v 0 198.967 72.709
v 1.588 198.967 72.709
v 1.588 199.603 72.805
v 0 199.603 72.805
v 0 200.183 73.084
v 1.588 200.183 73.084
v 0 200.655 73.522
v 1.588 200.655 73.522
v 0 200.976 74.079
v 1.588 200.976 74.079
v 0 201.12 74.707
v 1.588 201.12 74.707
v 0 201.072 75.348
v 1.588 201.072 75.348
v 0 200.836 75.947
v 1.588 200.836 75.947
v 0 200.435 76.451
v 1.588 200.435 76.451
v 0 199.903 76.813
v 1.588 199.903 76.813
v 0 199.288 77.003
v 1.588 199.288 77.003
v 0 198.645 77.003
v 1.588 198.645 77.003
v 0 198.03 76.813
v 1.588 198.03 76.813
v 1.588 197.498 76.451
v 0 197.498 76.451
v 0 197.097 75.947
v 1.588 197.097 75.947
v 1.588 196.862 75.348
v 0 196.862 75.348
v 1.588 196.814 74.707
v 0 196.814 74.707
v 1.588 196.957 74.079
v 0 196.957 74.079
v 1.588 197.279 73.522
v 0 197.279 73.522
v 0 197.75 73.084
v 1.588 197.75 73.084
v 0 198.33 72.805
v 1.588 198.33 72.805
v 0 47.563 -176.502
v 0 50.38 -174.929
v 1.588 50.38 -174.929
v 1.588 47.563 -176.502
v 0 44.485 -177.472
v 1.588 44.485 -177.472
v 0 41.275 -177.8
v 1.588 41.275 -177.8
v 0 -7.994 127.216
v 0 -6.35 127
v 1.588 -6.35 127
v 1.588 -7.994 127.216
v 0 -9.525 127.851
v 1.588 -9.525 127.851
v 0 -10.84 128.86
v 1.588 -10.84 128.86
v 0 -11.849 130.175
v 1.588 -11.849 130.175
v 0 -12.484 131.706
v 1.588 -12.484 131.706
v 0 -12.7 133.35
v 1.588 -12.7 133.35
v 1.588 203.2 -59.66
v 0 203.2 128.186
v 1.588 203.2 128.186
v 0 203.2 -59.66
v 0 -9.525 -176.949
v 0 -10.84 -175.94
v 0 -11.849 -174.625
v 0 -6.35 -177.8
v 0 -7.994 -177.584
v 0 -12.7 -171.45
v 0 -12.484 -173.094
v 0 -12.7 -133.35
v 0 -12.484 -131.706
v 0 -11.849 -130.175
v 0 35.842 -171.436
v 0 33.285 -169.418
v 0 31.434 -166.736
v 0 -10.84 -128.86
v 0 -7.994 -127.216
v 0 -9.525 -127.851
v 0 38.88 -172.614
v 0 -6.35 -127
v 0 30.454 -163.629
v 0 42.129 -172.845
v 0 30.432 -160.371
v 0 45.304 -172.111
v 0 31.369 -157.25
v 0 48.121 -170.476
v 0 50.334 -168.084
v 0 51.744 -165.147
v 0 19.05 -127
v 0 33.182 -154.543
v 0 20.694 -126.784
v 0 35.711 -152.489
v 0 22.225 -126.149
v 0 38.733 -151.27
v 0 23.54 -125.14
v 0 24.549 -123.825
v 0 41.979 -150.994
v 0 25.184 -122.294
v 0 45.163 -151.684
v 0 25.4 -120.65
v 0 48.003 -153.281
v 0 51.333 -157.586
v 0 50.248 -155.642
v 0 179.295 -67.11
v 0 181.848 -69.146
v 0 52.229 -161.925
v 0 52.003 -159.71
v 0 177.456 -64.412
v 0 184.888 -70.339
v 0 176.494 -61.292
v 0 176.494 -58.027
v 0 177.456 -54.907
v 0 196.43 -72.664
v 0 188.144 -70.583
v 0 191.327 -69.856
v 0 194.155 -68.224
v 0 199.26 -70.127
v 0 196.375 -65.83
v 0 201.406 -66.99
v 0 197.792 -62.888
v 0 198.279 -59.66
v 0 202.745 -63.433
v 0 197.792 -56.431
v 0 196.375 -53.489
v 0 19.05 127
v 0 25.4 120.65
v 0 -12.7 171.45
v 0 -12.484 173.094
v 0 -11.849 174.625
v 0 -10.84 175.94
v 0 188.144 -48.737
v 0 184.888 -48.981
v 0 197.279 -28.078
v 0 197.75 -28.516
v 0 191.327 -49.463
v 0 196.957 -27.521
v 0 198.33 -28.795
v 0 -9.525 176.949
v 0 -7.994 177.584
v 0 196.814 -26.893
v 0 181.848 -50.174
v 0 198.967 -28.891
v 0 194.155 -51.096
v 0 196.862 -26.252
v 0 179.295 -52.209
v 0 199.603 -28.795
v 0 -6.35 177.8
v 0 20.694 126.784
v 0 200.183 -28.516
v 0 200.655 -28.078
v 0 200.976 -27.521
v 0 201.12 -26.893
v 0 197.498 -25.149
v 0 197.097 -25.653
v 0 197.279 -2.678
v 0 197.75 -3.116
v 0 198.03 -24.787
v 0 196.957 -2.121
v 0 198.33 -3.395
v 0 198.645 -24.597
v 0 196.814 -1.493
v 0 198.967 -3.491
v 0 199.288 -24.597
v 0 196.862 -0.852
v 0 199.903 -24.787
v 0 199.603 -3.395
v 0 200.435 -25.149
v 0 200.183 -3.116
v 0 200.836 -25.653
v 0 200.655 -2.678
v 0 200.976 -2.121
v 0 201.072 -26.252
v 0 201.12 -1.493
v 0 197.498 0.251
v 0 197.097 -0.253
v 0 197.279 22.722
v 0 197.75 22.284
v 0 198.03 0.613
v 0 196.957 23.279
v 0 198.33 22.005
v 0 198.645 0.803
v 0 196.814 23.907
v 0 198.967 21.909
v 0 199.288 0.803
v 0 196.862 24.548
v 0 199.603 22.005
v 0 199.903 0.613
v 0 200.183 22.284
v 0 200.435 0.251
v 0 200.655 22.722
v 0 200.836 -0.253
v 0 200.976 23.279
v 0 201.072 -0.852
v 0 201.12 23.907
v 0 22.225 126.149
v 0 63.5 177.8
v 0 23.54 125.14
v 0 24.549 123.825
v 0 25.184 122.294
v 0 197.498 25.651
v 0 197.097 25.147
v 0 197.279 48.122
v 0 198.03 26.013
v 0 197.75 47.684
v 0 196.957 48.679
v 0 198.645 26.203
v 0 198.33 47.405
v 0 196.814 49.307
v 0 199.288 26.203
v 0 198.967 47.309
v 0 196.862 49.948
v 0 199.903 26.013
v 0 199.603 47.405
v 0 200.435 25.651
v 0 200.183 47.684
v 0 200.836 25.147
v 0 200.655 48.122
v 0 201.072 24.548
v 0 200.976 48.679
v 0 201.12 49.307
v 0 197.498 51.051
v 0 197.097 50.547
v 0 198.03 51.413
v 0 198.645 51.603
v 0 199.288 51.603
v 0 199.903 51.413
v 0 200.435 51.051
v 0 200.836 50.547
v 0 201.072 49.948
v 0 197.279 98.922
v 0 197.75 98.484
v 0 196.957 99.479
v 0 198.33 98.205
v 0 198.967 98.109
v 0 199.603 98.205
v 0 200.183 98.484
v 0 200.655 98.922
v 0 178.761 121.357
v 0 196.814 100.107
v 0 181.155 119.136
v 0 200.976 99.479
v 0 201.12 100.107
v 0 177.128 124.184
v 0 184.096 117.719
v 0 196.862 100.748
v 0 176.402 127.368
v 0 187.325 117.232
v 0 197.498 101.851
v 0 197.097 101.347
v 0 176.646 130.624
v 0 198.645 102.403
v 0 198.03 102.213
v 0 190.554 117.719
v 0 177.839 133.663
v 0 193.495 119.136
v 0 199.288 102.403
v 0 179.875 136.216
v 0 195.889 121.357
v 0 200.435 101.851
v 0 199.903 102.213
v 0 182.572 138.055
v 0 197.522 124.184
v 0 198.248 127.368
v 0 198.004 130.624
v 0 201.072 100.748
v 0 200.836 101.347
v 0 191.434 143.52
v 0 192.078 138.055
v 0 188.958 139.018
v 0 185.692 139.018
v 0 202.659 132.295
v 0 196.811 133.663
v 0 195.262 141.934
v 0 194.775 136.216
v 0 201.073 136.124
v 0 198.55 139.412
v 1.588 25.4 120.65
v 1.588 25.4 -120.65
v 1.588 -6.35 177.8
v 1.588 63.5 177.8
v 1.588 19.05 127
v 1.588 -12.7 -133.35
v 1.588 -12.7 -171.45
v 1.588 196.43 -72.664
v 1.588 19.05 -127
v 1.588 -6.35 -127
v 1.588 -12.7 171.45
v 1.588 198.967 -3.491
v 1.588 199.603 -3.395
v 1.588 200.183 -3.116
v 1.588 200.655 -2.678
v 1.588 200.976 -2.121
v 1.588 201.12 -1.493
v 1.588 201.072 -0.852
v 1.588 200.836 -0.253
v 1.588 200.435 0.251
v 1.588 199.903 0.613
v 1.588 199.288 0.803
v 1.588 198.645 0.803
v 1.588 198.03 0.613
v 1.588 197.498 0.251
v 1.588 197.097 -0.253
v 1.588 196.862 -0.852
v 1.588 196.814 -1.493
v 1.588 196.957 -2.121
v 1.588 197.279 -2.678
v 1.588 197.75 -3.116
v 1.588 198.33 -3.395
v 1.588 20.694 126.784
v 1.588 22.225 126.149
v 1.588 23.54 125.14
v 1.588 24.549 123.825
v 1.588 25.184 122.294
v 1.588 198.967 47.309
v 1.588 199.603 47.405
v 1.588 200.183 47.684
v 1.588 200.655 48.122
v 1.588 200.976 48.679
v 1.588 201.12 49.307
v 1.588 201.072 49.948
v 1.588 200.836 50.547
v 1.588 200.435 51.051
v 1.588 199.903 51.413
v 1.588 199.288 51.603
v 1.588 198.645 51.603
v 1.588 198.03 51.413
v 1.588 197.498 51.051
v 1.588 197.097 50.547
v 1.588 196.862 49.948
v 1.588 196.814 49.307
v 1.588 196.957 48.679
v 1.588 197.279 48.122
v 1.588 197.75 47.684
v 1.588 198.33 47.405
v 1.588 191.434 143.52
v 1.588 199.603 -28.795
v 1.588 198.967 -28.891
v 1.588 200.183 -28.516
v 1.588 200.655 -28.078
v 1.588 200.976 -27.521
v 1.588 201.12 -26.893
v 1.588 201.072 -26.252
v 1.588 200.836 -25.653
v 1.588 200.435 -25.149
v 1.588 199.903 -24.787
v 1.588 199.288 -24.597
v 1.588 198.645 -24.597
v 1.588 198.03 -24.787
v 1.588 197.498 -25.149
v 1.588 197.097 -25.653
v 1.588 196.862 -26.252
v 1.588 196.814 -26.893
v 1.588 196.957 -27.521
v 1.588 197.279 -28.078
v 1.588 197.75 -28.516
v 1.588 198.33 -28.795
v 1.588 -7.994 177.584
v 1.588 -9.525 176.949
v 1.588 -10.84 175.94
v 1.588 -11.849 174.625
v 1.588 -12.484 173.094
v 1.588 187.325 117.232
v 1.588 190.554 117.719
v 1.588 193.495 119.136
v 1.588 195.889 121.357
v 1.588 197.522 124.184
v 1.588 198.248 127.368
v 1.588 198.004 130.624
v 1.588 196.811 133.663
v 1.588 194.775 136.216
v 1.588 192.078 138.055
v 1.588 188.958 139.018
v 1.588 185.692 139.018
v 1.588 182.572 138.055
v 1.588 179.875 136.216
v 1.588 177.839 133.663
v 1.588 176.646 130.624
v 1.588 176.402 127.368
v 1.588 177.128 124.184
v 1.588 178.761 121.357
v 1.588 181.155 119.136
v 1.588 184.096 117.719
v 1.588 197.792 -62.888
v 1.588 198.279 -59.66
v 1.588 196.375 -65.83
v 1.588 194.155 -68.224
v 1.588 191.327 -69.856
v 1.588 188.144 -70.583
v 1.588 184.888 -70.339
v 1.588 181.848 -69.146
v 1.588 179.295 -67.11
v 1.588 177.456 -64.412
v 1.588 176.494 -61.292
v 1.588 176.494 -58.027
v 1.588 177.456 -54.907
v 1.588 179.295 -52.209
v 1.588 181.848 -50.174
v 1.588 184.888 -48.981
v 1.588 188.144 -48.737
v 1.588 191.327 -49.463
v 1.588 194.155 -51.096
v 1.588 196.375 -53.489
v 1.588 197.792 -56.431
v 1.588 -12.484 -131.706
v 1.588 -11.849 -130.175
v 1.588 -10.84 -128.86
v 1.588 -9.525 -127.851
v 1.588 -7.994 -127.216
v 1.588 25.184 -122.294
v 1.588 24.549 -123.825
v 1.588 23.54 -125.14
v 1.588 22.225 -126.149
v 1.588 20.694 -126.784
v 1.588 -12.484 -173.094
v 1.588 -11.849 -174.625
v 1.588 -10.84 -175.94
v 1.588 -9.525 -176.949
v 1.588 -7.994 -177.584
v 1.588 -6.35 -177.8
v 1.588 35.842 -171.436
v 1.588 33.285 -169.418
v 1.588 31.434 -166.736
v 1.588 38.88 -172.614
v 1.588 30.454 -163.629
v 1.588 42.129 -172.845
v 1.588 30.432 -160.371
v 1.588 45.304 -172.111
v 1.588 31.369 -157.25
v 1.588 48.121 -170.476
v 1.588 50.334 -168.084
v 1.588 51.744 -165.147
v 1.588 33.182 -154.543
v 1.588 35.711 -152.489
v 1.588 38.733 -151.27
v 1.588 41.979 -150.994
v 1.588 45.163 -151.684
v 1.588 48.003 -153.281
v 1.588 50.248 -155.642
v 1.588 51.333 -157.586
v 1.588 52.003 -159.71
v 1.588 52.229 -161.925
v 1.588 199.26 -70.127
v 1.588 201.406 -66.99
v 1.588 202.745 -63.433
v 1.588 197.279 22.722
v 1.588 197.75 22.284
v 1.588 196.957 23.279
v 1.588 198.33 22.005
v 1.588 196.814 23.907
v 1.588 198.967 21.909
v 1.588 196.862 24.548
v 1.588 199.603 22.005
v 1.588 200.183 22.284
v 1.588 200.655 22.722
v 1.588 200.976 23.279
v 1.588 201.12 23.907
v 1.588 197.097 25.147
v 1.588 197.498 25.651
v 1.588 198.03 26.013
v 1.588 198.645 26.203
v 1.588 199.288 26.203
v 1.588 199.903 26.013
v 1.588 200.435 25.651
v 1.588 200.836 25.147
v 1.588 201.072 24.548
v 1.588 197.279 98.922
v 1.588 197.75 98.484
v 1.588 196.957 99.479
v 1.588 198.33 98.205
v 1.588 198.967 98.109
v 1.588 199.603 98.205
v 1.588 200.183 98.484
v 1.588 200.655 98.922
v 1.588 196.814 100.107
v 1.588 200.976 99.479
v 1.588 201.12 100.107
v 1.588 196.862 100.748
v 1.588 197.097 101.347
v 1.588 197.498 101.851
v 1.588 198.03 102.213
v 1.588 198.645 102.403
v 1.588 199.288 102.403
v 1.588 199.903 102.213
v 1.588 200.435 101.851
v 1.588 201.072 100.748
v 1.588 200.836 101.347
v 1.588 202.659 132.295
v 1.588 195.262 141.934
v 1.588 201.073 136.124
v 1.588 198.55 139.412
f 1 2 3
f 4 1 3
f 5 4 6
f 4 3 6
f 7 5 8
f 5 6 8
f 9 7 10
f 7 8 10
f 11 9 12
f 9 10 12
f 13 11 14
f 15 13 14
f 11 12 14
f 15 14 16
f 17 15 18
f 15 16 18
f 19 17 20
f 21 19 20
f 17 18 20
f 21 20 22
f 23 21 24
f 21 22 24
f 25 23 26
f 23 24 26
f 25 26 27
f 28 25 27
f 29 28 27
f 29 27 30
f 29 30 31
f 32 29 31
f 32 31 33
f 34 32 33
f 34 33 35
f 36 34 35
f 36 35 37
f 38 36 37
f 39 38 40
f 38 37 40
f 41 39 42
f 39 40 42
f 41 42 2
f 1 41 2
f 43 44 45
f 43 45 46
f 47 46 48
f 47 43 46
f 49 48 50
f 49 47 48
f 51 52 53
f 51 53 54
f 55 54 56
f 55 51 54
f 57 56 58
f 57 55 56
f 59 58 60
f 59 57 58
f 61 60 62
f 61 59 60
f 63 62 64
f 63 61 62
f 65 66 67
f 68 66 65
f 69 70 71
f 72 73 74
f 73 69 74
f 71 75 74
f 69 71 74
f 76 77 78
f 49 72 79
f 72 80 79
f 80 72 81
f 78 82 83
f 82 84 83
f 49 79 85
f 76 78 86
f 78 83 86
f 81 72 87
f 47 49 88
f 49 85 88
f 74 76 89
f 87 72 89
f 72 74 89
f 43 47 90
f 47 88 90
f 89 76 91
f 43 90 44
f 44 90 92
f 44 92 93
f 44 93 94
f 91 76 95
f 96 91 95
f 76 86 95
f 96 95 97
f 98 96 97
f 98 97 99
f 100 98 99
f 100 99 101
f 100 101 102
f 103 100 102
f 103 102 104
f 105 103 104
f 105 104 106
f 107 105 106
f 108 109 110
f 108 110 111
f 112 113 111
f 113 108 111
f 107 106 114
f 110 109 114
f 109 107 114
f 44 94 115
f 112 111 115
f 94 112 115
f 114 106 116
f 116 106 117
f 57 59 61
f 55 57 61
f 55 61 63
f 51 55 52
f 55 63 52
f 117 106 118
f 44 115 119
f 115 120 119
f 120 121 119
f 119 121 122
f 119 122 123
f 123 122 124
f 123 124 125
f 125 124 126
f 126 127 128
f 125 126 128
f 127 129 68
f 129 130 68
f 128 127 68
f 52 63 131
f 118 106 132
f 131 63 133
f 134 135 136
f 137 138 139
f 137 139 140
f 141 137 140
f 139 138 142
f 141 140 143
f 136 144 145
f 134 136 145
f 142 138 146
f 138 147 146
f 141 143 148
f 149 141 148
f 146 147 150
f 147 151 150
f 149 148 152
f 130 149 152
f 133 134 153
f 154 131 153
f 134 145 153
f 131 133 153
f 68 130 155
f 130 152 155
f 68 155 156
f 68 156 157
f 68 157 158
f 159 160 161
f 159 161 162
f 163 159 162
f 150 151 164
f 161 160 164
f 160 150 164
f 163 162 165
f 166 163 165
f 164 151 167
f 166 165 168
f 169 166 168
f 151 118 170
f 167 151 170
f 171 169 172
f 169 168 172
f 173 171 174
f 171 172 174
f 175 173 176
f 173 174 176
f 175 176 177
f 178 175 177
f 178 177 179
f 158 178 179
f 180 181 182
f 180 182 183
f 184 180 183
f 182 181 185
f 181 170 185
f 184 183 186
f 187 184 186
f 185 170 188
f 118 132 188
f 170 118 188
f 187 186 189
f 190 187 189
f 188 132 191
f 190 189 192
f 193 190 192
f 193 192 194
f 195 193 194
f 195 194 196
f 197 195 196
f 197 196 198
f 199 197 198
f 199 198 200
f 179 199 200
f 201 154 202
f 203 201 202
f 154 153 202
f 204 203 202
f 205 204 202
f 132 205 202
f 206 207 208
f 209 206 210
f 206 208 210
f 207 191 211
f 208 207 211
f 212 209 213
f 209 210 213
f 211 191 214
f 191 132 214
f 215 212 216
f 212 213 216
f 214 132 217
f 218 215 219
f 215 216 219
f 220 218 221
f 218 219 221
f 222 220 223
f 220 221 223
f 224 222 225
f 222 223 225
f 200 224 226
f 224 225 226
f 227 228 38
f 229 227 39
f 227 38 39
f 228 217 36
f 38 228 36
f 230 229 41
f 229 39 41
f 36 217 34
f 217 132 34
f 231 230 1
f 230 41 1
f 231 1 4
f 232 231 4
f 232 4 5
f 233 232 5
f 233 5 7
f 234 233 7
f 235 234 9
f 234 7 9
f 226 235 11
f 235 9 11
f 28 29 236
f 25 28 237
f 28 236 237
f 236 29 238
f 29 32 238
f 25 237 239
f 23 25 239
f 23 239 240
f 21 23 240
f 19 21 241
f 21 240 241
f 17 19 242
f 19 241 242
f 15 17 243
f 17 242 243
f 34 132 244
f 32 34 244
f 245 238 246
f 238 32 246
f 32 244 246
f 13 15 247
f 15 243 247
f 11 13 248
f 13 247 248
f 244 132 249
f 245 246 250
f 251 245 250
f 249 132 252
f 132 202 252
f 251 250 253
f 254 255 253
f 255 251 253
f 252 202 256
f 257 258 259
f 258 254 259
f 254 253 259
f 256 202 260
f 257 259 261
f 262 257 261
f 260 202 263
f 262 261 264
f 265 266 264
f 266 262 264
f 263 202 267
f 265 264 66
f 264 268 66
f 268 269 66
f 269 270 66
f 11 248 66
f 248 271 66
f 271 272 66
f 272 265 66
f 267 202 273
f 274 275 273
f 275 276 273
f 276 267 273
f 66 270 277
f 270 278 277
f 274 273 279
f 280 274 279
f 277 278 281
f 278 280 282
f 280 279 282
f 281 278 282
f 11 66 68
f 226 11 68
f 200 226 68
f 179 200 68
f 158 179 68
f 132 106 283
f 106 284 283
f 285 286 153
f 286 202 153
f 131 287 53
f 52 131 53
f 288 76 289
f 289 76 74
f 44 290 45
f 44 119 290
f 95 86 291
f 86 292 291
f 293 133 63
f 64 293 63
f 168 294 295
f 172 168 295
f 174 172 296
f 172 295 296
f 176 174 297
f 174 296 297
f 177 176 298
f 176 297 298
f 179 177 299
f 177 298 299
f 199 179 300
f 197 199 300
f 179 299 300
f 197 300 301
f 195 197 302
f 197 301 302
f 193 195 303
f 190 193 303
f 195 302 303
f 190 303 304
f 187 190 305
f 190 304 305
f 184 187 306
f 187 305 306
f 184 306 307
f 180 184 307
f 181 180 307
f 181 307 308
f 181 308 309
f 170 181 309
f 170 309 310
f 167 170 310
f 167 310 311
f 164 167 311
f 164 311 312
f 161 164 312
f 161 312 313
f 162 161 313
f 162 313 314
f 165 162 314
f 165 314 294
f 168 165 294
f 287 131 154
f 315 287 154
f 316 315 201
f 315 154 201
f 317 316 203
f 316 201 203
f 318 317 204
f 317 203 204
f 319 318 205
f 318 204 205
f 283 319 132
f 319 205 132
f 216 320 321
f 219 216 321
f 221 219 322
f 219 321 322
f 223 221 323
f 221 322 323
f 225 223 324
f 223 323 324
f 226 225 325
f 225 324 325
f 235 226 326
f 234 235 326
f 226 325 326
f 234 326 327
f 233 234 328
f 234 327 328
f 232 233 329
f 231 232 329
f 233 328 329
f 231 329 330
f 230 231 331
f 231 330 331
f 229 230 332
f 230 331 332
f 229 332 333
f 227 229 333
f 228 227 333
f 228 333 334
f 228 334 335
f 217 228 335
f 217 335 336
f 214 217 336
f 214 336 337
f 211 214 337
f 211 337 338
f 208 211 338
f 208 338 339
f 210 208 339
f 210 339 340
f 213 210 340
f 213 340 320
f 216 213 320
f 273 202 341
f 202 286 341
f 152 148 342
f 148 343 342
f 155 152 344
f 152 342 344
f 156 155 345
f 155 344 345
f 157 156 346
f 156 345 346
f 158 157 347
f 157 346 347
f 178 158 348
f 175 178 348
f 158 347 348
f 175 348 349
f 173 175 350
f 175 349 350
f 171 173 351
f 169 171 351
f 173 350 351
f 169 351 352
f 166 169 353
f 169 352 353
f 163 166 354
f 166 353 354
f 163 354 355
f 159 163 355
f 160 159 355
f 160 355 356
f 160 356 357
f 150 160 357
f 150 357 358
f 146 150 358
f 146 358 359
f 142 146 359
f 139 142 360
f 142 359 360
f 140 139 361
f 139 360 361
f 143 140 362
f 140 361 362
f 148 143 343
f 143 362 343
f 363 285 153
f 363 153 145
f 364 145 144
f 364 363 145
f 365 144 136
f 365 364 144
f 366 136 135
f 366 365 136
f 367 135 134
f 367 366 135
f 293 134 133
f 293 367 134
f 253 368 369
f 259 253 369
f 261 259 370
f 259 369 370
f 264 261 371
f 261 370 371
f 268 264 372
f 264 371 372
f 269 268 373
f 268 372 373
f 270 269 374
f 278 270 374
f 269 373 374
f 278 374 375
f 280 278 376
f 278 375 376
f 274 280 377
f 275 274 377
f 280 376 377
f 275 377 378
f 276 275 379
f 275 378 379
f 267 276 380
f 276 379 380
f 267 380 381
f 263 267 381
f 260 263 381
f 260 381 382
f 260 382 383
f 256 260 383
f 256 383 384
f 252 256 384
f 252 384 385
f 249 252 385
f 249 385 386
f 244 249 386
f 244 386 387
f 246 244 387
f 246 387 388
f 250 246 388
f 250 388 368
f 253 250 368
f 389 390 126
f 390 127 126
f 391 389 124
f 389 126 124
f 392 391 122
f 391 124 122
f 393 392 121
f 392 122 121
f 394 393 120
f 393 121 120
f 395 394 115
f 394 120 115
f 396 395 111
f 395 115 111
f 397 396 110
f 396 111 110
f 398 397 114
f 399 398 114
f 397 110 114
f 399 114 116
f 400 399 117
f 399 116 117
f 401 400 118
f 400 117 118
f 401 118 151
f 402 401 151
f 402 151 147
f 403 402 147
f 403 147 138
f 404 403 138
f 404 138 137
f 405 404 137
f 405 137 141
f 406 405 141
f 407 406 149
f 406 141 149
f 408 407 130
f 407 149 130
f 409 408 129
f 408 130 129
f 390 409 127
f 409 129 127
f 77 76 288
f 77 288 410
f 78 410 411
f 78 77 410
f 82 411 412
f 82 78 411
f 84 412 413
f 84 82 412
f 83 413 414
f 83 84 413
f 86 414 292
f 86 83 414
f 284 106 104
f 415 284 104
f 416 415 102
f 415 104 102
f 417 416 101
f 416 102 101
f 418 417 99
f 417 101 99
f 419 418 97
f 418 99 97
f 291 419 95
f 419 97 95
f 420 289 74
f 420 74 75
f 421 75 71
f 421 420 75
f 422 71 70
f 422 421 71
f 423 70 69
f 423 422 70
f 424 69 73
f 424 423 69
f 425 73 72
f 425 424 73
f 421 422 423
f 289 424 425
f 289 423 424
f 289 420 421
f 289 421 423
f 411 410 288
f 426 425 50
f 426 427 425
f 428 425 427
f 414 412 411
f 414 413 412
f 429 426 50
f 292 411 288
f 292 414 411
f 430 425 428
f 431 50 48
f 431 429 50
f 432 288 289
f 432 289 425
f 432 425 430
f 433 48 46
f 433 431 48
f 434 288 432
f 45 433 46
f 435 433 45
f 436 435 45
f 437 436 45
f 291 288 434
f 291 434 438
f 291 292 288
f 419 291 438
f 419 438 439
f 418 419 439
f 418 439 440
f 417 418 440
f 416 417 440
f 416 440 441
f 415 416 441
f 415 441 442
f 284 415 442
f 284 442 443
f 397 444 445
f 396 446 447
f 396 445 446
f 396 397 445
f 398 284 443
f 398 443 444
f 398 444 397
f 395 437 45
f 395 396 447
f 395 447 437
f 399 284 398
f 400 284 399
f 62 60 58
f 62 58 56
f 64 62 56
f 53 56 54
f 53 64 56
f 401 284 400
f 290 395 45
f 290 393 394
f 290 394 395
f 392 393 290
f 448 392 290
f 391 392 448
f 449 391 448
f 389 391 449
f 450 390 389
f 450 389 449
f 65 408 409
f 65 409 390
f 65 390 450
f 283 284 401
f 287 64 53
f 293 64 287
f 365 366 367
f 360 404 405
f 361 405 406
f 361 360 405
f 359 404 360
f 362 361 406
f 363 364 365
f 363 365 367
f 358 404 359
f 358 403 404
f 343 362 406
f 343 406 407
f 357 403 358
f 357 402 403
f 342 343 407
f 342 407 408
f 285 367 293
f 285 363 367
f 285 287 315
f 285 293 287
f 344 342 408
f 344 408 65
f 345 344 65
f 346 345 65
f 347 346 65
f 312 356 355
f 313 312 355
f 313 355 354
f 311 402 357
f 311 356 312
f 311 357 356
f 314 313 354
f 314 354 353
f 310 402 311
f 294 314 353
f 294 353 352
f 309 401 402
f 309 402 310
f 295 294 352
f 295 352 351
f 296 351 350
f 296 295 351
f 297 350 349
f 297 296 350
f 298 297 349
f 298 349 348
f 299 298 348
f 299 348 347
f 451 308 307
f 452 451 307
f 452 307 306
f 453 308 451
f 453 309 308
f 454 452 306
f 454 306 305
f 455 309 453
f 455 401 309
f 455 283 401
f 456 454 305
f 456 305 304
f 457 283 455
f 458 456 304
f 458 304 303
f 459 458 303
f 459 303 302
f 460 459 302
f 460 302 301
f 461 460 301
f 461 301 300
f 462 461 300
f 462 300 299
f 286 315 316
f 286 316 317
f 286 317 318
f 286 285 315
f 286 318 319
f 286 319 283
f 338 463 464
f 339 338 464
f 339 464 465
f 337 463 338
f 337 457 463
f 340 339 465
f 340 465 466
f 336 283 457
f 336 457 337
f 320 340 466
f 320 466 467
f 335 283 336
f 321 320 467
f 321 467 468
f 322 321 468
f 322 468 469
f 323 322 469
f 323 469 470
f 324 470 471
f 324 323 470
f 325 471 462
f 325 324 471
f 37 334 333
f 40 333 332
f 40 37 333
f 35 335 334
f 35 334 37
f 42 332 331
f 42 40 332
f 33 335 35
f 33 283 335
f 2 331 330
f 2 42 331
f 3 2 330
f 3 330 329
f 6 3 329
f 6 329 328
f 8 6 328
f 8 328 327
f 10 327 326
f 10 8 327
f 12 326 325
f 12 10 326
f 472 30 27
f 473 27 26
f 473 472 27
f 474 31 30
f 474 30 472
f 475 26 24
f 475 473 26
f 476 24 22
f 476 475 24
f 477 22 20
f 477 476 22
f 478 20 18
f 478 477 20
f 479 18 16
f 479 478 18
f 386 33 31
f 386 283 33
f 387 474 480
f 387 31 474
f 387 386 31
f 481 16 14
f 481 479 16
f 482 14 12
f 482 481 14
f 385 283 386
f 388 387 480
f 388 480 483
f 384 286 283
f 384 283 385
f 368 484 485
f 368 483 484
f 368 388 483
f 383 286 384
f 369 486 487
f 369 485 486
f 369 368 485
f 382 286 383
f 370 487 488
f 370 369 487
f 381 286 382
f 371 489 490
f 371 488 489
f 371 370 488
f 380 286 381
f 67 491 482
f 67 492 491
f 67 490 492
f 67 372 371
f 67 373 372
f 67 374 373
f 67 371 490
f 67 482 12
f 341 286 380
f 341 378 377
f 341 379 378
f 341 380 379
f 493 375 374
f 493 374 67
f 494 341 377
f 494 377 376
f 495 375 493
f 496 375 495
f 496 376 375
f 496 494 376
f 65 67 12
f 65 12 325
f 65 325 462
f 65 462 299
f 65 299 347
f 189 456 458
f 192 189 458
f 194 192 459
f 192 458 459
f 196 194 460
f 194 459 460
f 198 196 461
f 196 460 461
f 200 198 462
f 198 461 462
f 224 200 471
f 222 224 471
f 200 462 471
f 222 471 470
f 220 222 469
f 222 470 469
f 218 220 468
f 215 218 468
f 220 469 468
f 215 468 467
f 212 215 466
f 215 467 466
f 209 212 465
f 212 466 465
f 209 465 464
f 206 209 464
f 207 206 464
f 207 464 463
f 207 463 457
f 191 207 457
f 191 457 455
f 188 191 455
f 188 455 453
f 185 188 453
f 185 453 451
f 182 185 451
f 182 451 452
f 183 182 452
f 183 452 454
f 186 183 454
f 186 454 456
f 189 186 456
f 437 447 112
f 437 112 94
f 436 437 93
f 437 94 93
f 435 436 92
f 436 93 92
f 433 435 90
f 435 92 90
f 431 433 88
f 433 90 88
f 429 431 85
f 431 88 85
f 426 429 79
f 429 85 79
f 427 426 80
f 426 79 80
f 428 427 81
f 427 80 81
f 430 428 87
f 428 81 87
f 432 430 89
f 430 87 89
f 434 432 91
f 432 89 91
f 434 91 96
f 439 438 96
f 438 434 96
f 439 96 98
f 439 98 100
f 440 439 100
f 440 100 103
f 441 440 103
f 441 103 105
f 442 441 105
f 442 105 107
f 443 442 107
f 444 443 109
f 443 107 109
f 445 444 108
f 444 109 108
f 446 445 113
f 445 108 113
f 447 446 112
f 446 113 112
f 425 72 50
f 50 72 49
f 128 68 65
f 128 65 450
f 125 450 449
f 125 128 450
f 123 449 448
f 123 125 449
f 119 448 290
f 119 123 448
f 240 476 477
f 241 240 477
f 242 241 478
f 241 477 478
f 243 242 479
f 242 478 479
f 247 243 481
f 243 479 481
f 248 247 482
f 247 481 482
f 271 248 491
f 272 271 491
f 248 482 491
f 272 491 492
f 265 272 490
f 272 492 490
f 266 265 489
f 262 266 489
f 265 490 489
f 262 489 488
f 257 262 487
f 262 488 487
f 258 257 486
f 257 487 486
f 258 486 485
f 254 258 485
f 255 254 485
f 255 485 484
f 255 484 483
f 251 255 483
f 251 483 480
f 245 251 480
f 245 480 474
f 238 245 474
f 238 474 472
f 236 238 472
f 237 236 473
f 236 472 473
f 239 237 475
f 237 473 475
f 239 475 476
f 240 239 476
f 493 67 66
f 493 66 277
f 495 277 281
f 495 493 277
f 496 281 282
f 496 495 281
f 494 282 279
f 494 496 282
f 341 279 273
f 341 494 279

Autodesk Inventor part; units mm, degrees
ref_plane "YZ Plane" through (0, 0, 0) normal (1, 0, 0) x (0, 1, 0)
ref_plane "XZ Plane" through (0, 0, 0) normal (0, 1, 0) x (-1, 0, 0)
ref_plane "XY Plane" through (0, 0, 0) normal (0, 0, 1) x (1, 0, 0)
sketch "Sketch1" plane through (0, 0, 0) normal (1, 0, 0) x (0, 1, 0)
  line L0 (-12.7, -177.8) -> (12.7, -177.8)
  line L1 (12.7, -177.8) -> (12.7, 177.8)
  line L2 (12.7, 177.8) -> (-12.7, 177.8)
  line L3 (-12.7, 177.8) -> (-12.7, -177.8)
  line L4 (-12.7, -177.8) -> (12.7, 177.8) construction
  line L5 (12.7, -177.8) -> (-12.7, 177.8) construction
  line L6 (12.7, -101.6) -> (12.7, 177.8)
  line L7 (12.7, 177.8) -> (25.4, 177.8)
  line L8 (25.4, 177.8) -> (25.4, -177.8)
  line L9 (25.4, -177.8) -> (12.7, -177.8)
  line L10 (12.7, -177.8) -> (12.7, 177.8)
  line L11 (25.4, 177.8) -> (203.2, 177.8)
  line L12 (203.2, 177.8) -> (203.2, -177.8)
  line L13 (203.2, -177.8) -> (25.4, -177.8)
  line L14 (25.4, -177.8) -> (25.4, 177.8)
  circle A0 centre (41.275, -161.925) radius 15.875
  circle A1 centre (187.325, -59.6597) radius 15.875
  line L15 (41.275, -161.925) -> (203.2, -48.5439)
  line L16 (41.275, -161.925) -> (238.9489, -161.925) construction
  line L17 (196.4305, -72.6637) -> (50.3805, -174.929)
  circle A2 centre (187.325, -59.6597) radius 10.9537
  circle A3 centre (41.275, -161.925) radius 10.9538
  point P0 (0, 0)
  point P1 (203.2, -59.6597)
  point P2 (41.275, -177.8)
  dimension "d7" = 31.75
  dimension "d8" = 31.75
  dimension "d0" = 25.4
  dimension "d1" = 355.6
  dimension "d4" = 12.7
  dimension "d5" = 177.8
  dimension "d6" = 355.6
  dimension "d9" = 35
  dimension "d10" = 21.9075
  dimension "d11" = 21.9075
extrude "Extrusion1" add sketch "Sketch1" along normal blind 1.5875 contours L3 L2 L1 L0 | L1 L7 L8 L9 | L8 A0 L13 | L8 L11 L12 L15 A1 A0 | A0 | L15 A1 L17 A0 | L15 A2 A1 | A1 L15 A2 | A1 L15 L12
sketch "Sketch2" plane through (1.5875, 0, 0) normal (1, 0, 0) x (0, 0, -1)
  line L0 (-177.8, -12.7) -> (177.8, -12.7) projected
  line L1 (-127, -12.7) -> (127, -12.7)
  line L2 (127, -12.7) -> (127, 25.4)
  line L3 (127, 25.4) -> (-127, 25.4)
  line L4 (-127, 25.4) -> (-127, -12.7)
  line L5 (-177.8, 203.2) -> (-177.8, -12.7) projected
  line L6 (177.8, -12.7) -> (177.8, 41.275) projected
  point P0 (0, 0)
  point P1 (127, -12.7)
  dimension "d14" = 38.1
  dimension "d15" = 50.8
  dimension "d16" = 50.8
extrude "Extrusion2" cut sketch "Sketch2" against normal blind 1.5875
sketch "Sketch3" plane through (1.5875, 0, 0) normal (1, 0, 0) x (0, 0, -1)
  line L0 (-177.8, 203.2) -> (-177.8, -12.7) projected
  line L1 (-177.8, -12.7) -> (-177.8, 63.5)
  line L2 (-177.8, 63.5) -> (-140.3675, 203.2)
  line L3 (59.6597, 203.2) -> (-177.8, 203.2) projected
  circle A0 centre (-128.1862, 187.325) radius 15.875
  circle A1 centre (-128.1862, 187.325) radius 10.9537
  point P0 (0, 0)
  point P1 (-143.5203, 191.4338)
  point P2 (-128.1862, 203.2)
  dimension "d19" = 76.2
  dimension "d20" = 165
  dimension "d23" = 31.75
  dimension "d24" = 21.9075
extrude "Extrusion3" cut sketch "Sketch3" against normal blind 1.5875 contours L3 L2 L0 | L3 A0 L2 | A1
fillet "Fillet1" radius 6.35 6 edges at (0.7937, -12.7, 127) (0.7937, -12.7, 177.8) (0.7937, 25.4, 127) (0.7937, 25.4, -127) (0.7937, -12.7, -127) (0.7937, -12.7, -177.8)
sketch "Sketch4" plane through (1.5875, 0, 0) normal (1, 0, 0) x (0, 0, -1)
  point P0 (0, 0)
sketch "Sketch5" plane through (1.5875, 0, 0) normal (1, 0, 0) x (0, 0, -1)
  circle A0 centre (59.6597, 187.325) radius 10.9537 projected
  circle A1 centre (59.6597, 187.325) radius 25.4
  circle A2 centre (161.925, 41.275) radius 10.9538 projected
  circle A3 centre (161.925, 41.275) radius 25.4
  circle A4 centre (26.7321, 198.9667) radius 9.525
  circle A5 centre (26.7321, 198.9667) radius 4.2333
  line L0 (59.6597, 203.2) -> (-128.1862, 203.2) projected
  circle A6 centre (26.7321, 198.9667) radius 2.159
  point P0 (0, 0)
  dimension "d26" = 50.8
  dimension "d27" = 50.8
  dimension "d28" = 19.05
  dimension "d29" = 8.4667
  dimension "d30" = 4.318
extrude "Extrusion4" cut sketch "Sketch5" against normal blind 1.5875 contours A6
pattern_linear "Rectangular Pattern1" count 6 spacing 25.4 along (0, 0, 1) of "Extrusion4"
properties part number "side 1.1" material "Acetal Resin, Black"
